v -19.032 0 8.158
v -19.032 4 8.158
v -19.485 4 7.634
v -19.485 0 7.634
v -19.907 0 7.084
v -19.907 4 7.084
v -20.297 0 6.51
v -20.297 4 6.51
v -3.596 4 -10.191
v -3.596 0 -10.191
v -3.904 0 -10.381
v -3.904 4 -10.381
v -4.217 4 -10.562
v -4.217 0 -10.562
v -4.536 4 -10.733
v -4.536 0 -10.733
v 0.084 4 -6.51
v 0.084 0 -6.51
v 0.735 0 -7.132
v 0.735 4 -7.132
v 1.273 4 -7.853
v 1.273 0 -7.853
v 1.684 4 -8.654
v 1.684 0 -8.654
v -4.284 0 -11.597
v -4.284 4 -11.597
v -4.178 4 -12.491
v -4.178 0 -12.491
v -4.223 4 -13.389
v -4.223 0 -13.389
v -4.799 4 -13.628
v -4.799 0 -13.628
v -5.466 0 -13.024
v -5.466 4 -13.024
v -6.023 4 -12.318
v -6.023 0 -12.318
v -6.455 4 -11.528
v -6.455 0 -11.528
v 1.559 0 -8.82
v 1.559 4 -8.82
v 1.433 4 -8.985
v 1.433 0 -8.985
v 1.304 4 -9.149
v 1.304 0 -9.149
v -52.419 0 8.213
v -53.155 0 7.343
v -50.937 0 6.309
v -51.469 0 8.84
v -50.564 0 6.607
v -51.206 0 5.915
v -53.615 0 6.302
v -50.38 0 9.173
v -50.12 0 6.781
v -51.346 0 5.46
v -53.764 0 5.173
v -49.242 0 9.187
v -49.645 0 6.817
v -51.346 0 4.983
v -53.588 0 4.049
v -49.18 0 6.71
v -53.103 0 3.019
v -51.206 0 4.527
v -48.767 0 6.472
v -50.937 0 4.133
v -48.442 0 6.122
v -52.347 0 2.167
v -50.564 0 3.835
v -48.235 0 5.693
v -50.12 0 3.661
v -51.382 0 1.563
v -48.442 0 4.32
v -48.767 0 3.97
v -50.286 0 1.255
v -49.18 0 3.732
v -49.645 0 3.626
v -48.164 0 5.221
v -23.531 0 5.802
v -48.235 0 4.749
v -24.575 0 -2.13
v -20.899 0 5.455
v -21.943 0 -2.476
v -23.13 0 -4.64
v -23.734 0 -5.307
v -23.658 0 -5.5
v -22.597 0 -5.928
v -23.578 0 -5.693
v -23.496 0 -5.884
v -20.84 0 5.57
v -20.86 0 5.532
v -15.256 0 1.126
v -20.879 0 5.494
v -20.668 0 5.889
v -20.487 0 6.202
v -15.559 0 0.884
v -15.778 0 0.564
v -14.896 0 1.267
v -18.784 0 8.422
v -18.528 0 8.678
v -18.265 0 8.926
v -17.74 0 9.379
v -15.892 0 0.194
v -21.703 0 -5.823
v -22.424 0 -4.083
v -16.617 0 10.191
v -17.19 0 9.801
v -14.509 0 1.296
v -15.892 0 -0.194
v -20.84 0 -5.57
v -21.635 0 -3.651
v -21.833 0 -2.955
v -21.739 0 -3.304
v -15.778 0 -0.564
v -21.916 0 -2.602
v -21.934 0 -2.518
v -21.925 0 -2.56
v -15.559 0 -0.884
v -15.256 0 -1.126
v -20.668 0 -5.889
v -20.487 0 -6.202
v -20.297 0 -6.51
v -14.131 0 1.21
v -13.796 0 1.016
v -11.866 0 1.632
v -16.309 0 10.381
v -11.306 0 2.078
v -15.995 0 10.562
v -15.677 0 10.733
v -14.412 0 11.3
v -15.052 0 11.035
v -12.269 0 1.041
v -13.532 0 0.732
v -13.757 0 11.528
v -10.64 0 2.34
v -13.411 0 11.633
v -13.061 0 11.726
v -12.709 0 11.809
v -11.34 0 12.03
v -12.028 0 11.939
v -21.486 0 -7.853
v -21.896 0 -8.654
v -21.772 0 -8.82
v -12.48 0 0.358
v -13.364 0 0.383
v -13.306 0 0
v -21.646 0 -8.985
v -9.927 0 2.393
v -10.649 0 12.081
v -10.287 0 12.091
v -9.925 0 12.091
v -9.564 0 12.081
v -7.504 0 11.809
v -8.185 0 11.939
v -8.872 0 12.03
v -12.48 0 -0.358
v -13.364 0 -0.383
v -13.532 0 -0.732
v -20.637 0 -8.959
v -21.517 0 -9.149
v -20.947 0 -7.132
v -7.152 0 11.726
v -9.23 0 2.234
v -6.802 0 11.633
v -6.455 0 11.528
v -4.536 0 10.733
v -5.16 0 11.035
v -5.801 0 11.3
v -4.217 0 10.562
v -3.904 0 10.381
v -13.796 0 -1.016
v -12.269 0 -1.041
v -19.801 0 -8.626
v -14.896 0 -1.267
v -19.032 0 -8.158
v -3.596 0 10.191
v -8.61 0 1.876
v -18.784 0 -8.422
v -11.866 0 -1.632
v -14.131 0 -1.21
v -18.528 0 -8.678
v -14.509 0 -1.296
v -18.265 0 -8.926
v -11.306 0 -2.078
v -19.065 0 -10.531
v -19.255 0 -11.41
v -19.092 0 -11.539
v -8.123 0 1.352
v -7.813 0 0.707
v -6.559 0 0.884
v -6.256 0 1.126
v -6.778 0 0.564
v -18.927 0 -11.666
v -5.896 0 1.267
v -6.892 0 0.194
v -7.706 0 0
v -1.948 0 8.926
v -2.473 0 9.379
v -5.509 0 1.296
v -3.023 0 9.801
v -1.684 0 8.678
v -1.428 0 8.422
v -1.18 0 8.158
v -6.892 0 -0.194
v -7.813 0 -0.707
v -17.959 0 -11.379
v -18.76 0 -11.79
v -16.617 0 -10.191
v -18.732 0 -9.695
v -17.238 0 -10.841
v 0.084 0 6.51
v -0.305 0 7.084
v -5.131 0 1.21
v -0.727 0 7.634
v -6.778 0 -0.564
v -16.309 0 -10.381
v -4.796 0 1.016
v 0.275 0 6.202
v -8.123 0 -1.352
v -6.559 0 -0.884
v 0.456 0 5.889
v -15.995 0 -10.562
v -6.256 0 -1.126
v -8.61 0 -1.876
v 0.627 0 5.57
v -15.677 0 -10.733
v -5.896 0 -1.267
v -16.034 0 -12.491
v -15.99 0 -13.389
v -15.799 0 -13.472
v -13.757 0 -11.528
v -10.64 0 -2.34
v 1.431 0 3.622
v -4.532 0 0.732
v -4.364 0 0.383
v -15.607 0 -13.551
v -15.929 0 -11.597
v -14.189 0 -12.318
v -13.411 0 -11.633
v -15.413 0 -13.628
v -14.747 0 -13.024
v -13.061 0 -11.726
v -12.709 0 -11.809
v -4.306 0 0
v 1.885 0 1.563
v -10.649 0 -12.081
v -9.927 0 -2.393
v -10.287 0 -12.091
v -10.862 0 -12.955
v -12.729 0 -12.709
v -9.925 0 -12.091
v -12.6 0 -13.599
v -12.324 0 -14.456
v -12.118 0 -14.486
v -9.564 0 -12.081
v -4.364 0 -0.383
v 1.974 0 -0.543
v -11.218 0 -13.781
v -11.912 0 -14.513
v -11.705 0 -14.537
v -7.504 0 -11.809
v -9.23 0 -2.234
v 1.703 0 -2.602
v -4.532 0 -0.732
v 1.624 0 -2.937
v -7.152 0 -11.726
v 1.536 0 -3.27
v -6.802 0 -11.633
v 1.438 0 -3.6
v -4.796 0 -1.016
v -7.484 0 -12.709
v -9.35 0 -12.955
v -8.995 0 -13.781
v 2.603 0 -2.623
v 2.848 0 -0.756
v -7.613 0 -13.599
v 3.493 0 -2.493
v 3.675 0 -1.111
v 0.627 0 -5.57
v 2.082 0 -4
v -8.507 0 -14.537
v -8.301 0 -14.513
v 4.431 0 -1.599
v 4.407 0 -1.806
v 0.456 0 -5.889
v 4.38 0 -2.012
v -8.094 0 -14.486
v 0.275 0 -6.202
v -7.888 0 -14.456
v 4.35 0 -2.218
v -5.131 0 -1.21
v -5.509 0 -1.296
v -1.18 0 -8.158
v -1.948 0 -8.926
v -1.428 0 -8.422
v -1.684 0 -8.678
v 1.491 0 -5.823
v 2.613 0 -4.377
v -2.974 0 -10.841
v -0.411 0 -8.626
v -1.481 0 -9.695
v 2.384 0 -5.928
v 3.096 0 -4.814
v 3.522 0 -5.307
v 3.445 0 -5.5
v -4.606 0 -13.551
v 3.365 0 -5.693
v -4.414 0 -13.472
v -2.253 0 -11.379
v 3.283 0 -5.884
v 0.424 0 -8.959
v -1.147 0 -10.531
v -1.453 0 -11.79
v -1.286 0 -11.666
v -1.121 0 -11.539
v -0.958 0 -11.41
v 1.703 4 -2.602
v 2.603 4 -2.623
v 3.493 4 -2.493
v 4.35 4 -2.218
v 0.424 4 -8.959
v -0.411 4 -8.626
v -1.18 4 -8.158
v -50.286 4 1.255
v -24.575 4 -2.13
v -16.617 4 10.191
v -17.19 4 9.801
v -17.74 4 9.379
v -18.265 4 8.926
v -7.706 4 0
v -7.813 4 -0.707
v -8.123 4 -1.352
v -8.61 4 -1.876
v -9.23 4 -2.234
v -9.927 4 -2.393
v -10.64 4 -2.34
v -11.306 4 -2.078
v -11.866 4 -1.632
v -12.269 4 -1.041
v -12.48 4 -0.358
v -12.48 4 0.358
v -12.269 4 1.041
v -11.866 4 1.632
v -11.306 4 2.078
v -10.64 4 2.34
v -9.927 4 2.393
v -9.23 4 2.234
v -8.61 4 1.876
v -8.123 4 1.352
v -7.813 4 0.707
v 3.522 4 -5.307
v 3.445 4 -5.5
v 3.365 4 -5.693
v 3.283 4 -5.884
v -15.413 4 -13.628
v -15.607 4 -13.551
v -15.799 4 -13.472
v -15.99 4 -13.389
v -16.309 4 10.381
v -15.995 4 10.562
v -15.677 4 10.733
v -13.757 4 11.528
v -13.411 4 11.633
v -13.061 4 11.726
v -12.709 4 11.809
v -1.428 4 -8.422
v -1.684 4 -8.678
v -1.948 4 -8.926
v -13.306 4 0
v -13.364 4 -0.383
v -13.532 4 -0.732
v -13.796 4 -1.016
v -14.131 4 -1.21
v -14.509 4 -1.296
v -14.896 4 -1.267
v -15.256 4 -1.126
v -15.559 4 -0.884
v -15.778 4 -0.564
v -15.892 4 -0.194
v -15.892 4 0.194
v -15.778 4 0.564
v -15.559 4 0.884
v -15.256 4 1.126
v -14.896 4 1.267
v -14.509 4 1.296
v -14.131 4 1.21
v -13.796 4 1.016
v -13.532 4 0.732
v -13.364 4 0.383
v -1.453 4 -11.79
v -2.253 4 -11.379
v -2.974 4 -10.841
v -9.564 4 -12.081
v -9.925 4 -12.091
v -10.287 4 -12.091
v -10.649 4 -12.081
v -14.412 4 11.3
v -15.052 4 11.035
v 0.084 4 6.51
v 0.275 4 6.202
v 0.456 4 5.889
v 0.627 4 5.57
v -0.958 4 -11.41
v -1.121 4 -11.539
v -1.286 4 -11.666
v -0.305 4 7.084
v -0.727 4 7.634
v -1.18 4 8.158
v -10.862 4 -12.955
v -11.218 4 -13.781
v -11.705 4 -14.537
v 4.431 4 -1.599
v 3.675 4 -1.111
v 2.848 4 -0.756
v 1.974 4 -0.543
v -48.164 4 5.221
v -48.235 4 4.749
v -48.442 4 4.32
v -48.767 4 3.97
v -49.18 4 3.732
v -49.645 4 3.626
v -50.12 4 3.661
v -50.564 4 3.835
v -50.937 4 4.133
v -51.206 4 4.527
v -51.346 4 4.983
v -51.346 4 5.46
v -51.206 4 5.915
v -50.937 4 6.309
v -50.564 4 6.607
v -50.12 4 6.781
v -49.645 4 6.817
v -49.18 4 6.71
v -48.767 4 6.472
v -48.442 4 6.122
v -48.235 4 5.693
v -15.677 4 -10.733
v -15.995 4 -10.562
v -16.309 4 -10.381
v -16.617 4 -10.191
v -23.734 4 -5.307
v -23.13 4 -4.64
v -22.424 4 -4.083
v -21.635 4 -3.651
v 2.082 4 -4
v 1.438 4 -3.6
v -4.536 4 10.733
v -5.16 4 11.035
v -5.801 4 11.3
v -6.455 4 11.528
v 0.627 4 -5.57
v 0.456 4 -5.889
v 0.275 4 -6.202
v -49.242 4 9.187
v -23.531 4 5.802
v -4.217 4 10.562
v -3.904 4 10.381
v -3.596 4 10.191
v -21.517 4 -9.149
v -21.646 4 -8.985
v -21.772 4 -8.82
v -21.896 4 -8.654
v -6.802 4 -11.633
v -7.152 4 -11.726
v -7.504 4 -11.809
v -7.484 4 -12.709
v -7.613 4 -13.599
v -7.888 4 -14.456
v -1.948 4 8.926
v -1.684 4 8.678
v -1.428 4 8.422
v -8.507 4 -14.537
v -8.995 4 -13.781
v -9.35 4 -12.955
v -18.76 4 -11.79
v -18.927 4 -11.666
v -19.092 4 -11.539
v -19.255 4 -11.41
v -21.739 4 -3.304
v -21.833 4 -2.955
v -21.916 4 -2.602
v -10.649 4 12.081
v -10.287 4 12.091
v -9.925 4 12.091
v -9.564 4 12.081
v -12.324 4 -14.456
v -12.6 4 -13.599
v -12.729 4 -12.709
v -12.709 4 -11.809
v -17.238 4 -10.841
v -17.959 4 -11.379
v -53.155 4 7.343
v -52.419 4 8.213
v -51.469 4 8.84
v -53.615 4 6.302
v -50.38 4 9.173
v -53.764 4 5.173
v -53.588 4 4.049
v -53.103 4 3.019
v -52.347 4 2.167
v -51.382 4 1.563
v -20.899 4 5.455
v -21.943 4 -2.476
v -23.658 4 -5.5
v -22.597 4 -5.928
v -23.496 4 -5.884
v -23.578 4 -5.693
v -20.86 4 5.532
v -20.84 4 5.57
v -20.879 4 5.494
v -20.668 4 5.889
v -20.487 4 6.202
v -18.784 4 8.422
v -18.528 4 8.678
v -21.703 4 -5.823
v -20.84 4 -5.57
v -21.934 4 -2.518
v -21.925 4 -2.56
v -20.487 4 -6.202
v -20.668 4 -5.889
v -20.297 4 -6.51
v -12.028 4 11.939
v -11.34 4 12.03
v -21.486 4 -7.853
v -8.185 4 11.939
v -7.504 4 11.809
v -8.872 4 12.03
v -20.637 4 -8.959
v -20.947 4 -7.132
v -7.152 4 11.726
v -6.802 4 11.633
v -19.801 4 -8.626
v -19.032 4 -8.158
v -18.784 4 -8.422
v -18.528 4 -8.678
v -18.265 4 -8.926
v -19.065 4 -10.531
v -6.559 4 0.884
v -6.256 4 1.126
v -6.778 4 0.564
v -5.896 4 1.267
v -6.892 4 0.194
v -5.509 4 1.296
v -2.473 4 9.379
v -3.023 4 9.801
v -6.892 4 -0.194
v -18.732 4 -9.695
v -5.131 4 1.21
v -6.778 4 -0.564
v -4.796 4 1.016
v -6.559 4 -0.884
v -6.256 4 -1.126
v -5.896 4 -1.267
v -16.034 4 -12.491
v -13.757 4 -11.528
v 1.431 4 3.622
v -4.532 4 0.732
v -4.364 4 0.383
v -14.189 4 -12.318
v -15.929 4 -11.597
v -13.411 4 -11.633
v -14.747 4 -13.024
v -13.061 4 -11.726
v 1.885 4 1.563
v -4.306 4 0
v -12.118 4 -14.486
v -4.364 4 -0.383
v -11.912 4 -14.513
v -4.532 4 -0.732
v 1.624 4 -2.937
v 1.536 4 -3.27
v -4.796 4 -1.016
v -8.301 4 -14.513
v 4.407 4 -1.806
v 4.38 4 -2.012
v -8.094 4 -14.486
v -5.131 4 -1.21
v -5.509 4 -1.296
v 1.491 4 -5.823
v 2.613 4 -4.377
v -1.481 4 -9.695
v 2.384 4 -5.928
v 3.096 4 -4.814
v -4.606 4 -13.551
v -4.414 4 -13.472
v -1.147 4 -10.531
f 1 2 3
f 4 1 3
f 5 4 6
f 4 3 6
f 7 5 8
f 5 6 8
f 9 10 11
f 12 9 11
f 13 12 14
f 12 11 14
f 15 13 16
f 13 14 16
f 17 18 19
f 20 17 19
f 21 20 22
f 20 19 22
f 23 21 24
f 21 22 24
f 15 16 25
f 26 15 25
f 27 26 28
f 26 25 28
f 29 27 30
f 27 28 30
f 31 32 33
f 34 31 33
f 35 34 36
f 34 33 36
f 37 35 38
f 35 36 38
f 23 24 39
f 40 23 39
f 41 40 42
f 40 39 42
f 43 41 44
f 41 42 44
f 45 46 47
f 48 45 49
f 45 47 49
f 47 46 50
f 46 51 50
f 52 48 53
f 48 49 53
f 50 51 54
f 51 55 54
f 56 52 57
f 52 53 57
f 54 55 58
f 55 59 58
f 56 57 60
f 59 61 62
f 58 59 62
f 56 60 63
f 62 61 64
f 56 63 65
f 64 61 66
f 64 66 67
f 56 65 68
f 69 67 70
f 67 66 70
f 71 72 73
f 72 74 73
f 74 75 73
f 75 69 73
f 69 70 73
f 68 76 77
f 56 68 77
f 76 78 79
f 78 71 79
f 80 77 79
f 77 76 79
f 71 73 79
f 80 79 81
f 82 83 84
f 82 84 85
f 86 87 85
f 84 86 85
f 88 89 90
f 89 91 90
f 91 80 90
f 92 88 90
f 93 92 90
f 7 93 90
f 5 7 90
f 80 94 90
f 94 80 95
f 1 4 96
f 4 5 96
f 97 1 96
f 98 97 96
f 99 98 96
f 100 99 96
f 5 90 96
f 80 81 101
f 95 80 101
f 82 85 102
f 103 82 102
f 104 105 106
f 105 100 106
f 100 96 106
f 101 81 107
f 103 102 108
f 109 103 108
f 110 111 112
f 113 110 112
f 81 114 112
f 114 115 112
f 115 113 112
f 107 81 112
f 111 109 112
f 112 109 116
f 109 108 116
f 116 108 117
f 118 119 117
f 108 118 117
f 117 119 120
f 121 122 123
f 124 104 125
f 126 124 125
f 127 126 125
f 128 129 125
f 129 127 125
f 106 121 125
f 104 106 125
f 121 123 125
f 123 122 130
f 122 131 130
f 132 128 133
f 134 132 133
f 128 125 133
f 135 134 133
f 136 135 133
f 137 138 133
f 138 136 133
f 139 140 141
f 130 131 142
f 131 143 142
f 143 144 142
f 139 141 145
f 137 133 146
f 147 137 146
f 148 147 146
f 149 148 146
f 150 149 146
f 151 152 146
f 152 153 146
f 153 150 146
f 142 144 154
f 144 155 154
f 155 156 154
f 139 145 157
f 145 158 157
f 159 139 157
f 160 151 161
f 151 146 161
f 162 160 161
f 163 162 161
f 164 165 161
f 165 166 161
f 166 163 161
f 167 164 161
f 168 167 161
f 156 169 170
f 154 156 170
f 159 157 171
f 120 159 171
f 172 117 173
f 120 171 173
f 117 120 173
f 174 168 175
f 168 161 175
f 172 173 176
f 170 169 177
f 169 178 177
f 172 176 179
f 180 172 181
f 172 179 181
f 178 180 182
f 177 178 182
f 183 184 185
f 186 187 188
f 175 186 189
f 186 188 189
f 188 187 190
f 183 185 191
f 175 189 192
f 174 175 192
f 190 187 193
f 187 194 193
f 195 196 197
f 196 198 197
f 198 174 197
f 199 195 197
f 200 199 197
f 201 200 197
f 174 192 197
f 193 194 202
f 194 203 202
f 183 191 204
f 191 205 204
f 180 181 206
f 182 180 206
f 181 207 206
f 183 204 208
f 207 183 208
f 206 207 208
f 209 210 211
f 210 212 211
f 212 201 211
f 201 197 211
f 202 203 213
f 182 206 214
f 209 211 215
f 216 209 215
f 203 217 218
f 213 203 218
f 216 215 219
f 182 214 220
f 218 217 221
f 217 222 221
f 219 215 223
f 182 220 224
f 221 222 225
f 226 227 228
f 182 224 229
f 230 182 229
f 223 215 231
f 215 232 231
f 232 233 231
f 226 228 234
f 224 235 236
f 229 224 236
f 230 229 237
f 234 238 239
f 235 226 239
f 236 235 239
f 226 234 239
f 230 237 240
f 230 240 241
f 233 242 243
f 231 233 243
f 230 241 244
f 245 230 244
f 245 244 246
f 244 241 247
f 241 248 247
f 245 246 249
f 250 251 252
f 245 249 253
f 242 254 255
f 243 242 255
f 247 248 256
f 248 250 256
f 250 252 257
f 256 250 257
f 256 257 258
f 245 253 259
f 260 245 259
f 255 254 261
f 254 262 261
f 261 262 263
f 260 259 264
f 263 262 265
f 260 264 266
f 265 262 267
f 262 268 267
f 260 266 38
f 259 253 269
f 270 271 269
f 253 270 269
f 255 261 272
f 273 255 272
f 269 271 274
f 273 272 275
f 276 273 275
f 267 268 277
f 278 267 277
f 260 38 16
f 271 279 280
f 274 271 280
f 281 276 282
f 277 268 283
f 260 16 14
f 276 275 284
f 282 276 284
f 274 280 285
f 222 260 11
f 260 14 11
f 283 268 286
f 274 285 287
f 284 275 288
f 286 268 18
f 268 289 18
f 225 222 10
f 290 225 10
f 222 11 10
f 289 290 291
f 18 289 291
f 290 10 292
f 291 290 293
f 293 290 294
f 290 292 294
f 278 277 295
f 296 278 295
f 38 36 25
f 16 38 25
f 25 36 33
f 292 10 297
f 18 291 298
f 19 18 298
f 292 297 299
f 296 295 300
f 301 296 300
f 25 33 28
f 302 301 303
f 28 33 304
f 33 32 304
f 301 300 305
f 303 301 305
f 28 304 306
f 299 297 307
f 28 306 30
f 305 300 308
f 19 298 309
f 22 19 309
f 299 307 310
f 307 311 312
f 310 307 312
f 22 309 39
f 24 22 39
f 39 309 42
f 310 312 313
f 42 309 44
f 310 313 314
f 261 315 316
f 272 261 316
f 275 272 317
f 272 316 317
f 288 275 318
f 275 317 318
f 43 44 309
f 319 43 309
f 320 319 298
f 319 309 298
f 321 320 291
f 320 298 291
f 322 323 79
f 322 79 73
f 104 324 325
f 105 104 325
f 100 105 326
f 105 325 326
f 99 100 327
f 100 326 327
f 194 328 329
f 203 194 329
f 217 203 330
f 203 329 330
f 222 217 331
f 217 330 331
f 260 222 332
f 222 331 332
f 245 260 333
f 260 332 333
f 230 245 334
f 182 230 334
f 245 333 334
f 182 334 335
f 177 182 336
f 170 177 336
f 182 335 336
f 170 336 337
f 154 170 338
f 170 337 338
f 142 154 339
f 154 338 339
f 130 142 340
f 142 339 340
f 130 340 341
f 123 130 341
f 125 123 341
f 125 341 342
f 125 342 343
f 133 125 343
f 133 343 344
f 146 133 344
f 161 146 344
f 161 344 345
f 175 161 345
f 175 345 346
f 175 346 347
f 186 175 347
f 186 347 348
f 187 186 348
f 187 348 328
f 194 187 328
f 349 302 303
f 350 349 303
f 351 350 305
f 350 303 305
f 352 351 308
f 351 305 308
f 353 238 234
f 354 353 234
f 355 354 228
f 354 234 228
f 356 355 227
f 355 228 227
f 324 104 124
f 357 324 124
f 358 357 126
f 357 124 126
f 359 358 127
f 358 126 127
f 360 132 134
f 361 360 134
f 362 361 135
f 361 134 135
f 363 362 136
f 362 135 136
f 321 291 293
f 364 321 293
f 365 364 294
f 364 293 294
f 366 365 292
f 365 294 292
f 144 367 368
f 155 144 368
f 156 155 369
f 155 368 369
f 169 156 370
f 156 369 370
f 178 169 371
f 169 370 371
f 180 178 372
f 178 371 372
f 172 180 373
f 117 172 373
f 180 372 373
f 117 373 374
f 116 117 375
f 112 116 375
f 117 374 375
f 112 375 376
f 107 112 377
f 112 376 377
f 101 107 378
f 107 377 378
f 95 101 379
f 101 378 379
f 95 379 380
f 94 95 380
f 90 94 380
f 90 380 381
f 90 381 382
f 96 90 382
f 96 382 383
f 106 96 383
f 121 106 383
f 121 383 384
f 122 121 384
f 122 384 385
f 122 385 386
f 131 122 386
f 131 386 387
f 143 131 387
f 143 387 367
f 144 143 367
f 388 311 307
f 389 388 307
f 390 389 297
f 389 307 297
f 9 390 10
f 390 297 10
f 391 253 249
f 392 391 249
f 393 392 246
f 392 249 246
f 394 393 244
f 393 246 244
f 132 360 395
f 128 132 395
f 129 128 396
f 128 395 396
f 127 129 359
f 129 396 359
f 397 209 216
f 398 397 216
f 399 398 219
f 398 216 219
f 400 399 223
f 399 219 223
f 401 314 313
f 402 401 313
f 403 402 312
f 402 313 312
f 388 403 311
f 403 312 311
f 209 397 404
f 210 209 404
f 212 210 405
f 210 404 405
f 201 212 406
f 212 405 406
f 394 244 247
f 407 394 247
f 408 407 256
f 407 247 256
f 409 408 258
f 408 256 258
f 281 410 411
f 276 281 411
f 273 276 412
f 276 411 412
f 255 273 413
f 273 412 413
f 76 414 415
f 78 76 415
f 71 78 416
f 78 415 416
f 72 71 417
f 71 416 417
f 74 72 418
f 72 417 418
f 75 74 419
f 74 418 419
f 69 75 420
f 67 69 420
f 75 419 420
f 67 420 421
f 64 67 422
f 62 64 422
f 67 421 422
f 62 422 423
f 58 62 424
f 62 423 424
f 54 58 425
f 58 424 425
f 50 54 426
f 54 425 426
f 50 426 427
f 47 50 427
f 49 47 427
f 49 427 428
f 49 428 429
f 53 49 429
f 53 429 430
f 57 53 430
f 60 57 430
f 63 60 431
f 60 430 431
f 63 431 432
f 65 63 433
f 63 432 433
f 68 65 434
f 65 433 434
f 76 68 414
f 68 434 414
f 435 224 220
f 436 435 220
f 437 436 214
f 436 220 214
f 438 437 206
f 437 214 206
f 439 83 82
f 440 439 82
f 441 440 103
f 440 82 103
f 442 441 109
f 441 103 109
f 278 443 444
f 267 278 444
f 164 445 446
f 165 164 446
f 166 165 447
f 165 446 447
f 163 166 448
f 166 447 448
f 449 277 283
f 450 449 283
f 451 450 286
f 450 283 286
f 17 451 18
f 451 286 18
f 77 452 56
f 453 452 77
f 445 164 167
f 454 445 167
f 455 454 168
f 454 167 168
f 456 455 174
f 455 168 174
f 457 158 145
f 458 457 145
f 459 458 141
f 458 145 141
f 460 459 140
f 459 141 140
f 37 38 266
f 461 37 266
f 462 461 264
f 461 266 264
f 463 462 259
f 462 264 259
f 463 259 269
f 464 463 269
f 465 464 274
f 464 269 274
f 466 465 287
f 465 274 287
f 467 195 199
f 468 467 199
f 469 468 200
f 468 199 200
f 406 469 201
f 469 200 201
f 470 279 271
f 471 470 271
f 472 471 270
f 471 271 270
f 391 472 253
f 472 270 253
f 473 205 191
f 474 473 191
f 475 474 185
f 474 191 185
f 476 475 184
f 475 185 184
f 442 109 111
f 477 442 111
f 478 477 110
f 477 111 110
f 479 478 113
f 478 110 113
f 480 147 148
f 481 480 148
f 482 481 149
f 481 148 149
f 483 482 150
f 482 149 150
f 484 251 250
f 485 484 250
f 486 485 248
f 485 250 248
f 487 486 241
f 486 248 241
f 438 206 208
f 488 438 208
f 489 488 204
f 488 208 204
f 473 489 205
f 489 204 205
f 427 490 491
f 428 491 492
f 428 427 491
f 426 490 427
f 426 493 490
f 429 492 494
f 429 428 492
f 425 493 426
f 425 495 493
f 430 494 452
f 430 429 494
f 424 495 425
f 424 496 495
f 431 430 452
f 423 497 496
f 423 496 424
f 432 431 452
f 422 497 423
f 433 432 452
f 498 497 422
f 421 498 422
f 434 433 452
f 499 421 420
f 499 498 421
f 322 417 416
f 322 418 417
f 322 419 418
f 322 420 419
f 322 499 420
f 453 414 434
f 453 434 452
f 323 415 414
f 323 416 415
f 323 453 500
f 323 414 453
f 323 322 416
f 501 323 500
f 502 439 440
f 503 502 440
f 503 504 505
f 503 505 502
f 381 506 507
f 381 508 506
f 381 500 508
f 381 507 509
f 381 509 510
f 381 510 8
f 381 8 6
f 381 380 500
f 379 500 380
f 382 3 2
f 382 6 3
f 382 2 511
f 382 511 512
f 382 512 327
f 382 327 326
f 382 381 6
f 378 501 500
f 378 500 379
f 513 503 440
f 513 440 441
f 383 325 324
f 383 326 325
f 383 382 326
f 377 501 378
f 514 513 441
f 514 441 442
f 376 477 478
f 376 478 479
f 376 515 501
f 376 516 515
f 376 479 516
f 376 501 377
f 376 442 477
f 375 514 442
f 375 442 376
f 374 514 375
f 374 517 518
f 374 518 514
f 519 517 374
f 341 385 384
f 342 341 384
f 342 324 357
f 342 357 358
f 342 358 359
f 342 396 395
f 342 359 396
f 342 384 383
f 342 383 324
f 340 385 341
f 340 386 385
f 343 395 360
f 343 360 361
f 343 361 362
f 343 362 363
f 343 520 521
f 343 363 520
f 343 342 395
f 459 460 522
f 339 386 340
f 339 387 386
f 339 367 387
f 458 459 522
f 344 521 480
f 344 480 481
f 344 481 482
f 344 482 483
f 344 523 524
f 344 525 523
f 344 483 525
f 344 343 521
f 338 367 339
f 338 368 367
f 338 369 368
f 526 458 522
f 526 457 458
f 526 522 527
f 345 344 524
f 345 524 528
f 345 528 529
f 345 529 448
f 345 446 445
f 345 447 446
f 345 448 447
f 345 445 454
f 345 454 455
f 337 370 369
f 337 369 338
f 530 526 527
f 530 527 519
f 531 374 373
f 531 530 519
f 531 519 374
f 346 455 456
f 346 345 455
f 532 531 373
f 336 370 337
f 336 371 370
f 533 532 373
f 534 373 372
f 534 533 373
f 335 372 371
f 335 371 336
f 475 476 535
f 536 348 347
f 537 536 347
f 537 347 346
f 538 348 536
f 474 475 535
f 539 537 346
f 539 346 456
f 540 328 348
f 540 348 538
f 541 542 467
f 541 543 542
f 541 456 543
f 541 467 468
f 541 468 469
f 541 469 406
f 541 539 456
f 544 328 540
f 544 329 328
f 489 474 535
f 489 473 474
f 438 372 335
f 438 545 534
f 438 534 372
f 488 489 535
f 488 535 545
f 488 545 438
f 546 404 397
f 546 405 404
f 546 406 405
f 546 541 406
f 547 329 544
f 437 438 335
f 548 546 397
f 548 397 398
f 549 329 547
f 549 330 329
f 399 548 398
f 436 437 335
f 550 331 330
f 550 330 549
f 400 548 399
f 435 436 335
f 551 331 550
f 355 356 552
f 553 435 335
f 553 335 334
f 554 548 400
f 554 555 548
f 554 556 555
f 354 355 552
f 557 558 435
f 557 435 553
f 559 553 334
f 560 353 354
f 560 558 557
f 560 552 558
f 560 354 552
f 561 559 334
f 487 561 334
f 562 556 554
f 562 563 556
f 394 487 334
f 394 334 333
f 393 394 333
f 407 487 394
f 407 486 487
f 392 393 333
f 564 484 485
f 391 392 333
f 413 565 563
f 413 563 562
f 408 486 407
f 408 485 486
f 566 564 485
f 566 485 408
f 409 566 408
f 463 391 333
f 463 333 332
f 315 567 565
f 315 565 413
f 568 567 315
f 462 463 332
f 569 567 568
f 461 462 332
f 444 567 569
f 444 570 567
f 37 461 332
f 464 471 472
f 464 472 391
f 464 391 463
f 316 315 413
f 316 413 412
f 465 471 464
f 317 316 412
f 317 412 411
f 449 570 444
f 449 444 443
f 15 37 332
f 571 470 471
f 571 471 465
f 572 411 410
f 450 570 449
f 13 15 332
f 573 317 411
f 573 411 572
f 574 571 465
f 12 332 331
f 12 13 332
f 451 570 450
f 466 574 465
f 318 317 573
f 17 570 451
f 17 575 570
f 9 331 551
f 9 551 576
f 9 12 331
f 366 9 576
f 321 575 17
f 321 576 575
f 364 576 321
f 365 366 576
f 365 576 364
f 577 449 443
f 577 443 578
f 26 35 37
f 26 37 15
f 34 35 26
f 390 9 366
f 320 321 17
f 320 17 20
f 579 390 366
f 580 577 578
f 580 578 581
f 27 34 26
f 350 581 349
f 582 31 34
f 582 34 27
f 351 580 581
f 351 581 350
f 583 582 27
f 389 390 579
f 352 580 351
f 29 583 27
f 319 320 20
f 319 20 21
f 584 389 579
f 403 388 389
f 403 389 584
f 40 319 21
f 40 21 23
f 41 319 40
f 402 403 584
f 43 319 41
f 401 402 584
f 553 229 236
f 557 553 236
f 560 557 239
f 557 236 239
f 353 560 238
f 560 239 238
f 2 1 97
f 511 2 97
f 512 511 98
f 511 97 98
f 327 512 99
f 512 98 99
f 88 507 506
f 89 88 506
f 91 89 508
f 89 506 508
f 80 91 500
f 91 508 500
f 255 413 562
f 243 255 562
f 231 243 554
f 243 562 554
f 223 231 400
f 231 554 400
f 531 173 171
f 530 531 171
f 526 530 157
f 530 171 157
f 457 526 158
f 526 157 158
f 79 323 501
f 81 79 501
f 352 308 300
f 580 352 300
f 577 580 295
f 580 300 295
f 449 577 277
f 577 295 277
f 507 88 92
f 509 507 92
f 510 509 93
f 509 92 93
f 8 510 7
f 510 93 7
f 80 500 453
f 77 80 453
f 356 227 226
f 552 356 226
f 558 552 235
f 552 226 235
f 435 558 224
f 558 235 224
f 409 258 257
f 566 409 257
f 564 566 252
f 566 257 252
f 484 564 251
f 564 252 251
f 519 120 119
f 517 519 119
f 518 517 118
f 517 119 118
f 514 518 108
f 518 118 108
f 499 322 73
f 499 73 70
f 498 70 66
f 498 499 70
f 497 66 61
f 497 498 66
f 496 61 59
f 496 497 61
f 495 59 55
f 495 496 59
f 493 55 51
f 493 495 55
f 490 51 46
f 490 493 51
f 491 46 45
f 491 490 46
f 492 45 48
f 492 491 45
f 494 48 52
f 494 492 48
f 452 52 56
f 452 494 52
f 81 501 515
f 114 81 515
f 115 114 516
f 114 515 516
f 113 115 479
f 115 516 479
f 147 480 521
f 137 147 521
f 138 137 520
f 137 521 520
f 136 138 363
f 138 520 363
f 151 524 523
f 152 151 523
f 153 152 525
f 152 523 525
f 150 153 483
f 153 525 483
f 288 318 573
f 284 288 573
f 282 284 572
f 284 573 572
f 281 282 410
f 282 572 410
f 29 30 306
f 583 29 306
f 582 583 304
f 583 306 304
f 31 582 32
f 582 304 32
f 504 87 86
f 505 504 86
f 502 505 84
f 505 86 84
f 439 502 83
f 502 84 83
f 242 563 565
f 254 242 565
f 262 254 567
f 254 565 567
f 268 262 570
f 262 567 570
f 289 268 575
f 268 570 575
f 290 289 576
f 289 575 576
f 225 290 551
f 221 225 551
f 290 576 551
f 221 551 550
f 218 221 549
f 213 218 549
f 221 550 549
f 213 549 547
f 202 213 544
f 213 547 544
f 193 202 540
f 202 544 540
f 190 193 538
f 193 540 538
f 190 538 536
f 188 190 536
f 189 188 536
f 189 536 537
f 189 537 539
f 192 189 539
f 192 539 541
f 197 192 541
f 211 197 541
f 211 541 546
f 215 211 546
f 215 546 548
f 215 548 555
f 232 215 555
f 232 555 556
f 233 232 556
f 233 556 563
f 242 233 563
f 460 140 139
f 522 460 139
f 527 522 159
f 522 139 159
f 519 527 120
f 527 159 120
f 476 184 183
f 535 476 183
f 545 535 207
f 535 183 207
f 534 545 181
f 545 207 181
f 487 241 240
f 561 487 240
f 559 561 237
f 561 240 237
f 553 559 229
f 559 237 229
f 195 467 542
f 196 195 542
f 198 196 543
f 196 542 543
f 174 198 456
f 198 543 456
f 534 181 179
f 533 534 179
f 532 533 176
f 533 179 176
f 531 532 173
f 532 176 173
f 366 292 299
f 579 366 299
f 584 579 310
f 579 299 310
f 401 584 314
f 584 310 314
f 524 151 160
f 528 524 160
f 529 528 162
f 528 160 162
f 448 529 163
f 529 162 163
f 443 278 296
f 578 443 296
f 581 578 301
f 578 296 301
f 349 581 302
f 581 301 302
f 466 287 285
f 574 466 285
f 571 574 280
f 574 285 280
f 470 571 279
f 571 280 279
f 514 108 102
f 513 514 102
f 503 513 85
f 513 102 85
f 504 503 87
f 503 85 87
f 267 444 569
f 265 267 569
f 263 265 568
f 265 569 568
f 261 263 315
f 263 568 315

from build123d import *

# Parameters (mm, degrees)
SKETCH1_R           = 1.5
SKETCH1_R_2         = 1.6
BOSS_EXTRUDE1_DEPTH = 4
SKETCH3_R           = 1.6
BOSS_EXTRUDE2_DEPTH = 4
CUT_EXTRUDE1_DEPTH  = 4
CUT_EXTRUDE2_REACH  = 6
SKETCH5_R           = 1.3
SKETCH5_R_2         = 2.4


with BuildPart() as part:
    # Sketch1 → Boss-Extrude1 (new body)
    with BuildSketch(Plane(origin=(0, 0, 0), x_dir=(1, 0, 0), z_dir=(0, 1, 0))):
        with BuildLine():
            Line((20.643657446, 4), (2.081641936, 4))
            ThreePointArc((2.081641936, 4), (2.861028333, 4.588201733), (3.521749436, 5.30713988))
            ThreePointArc((3.521749436, 5.30713988), (3.405395609, 5.596745198), (3.282888305, 5.883801663))
            ThreePointArc((3.282888305, 5.883801663), (1.93527598, 5.894040025), (0.627094961, 5.57027124))
            ThreePointArc((0.627094961, 5.57027124), (0.366286148, 6.046375), (0.084372603, 6.510293938))
            ThreePointArc((0.084372603, 6.510293938), (1.018855105, 7.48132754), (1.683794586, 8.65351323))
            ThreePointArc((1.683794586, 8.65351323), (1.496450048, 8.903135899), (1.303821399, 9.148703928))
            ThreePointArc((1.303821399, 9.148703928), (-0.000522033, 8.809805691), (-1.180330337, 8.158486898))
            ThreePointArc((-1.180330337, 8.158486898), (-1.555477026, 8.550865528), (-1.947855656, 8.926012217))
            ThreePointArc((-1.947855656, 8.926012217), (-1.296536862, 10.105820521), (-0.957638625, 11.410163953))
            ThreePointArc((-0.957638625, 11.410163953), (-1.203206655, 11.602792602), (-1.452829324, 11.79013714))
            ThreePointArc((-1.452829324, 11.79013714), (-2.625015014, 11.125197659), (-3.596048616, 10.190715157))
            ThreePointArc((-3.596048616, 10.190715157), (-4.059967554, 10.472628702), (-4.536071314, 10.733437515))
            ThreePointArc((-4.536071314, 10.733437515), (-4.212302529, 12.041618533), (-4.222540891, 13.389230859))
            ThreePointArc((-4.222540891, 13.389230859), (-4.509597355, 13.511738163), (-4.799202674, 13.62809199))
            ThreePointArc((-4.799202674, 13.62809199), (-5.759348103, 12.682425791), (-6.455432668, 11.528463019))
            ThreePointArc((-6.455432668, 11.528463019), (-6.976508546, 11.680699536), (-7.503891752, 11.809396783))
            ThreePointArc((-7.503891752, 11.809396783), (-7.529737283, 13.156800143), (-7.888414517, 14.455843809))
            ThreePointArc((-7.888414517, 14.455843809), (-8.197396993, 14.499881098), (-8.507248835, 14.537314892))
            ThreePointArc((-8.507248835, 14.537314892), (-9.18992168, 13.375367565), (-9.563620196, 12.080565177))
            ThreePointArc((-9.563620196, 12.080565177), (-10.106342554, 12.09275), (-10.649064912, 12.080565177))
            ThreePointArc((-10.649064912, 12.080565177), (-11.022763428, 13.375367565), (-11.705436272, 14.537314892))
            ThreePointArc((-11.705436272, 14.537314892), (-12.015288115, 14.499881098), (-12.324270591, 14.455843809))
            ThreePointArc((-12.324270591, 14.455843809), (-12.682947825, 13.156800143), (-12.708793355, 11.809396783))
            ThreePointArc((-12.708793355, 11.809396783), (-13.236176561, 11.680699536), (-13.757252439, 11.528463019))
            ThreePointArc((-13.757252439, 11.528463019), (-14.453337005, 12.682425791), (-15.413482434, 13.62809199))
            ThreePointArc((-15.413482434, 13.62809199), (-15.703087752, 13.511738163), (-15.990144217, 13.389230859))
            ThreePointArc((-15.990144217, 13.389230859), (-16.000382579, 12.041618533), (-15.676613793, 10.733437515))
            ThreePointArc((-15.676613793, 10.733437515), (-16.152717554, 10.472628702), (-16.616636492, 10.190715157))
            ThreePointArc((-16.616636492, 10.190715157), (-17.587670094, 11.125197659), (-18.759855783, 11.79013714))
            ThreePointArc((-18.759855783, 11.79013714), (-19.009478453, 11.602792602), (-19.255046482, 11.410163953))
            ThreePointArc((-19.255046482, 11.410163953), (-18.916148245, 10.105820521), (-18.264829452, 8.926012217))
            ThreePointArc((-18.264829452, 8.926012217), (-18.657208082, 8.550865528), (-19.032354771, 8.158486898))
            ThreePointArc((-19.032354771, 8.158486898), (-20.212163074, 8.809805691), (-21.516506507, 9.148703928))
            ThreePointArc((-21.516506507, 9.148703928), (-21.709135156, 8.903135899), (-21.896479694, 8.65351323))
            ThreePointArc((-21.896479694, 8.65351323), (-21.231540213, 7.48132754), (-20.297057711, 6.510293938))
            ThreePointArc((-20.297057711, 6.510293938), (-20.578971255, 6.046375), (-20.839780068, 5.57027124))
            ThreePointArc((-20.839780068, 5.57027124), (-22.147961087, 5.894040025), (-23.495573413, 5.883801663))
            ThreePointArc((-23.495573413, 5.883801663), (-23.618080717, 5.596745198), (-23.734434544, 5.30713988))
            ThreePointArc((-23.734434544, 5.30713988), (-22.788768345, 4.346994451), (-21.634805572, 3.650909885))
            ThreePointArc((-21.634805572, 3.650909885), (-21.78704209, 3.129834008), (-21.915739337, 2.602450802))
            ThreePointArc((-21.915739337, 2.602450802), (-23.263142697, 2.576605271), (-24.562186363, 2.217928037))
            ThreePointArc((-24.562186363, 2.217928037), (-24.606223651, 1.908945561), (-24.643657446, 1.599093719))
            ThreePointArc((-24.643657446, 1.599093719), (-23.481710119, 0.916420874), (-22.186907731, 0.542722358))
            ThreePointArc((-22.186907731, 0.542722358), (-22.199092554, 0), (-22.186907731, -0.542722358))
            ThreePointArc((-22.186907731, -0.542722358), (-23.481710119, -0.916420874), (-24.643657446, -1.599093719))
            ThreePointArc((-24.643657446, -1.599093719), (-24.606223651, -1.908945561), (-24.562186363, -2.217928037))
            ThreePointArc((-24.562186363, -2.217928037), (-23.263142697, -2.576605271), (-21.915739337, -2.602450802))
            ThreePointArc((-21.915739337, -2.602450802), (-21.78704209, -3.129834008), (-21.634805572, -3.650909885))
            ThreePointArc((-21.634805572, -3.650909885), (-22.788768345, -4.346994451), (-23.734434544, -5.30713988))
            ThreePointArc((-23.734434544, -5.30713988), (-23.618080717, -5.596745198), (-23.495573413, -5.883801663))
            ThreePointArc((-23.495573413, -5.883801663), (-22.147961087, -5.894040025), (-20.839780068, -5.57027124))
            ThreePointArc((-20.839780068, -5.57027124), (-20.578971255, -6.046375), (-20.297057711, -6.510293938))
            ThreePointArc((-20.297057711, -6.510293938), (-21.231540213, -7.48132754), (-21.896479694, -8.65351323))
            ThreePointArc((-21.896479694, -8.65351323), (-21.709135156, -8.903135899), (-21.516506507, -9.148703928))
            ThreePointArc((-21.516506507, -9.148703928), (-20.212163074, -8.809805691), (-19.032354771, -8.158486898))
            ThreePointArc((-19.032354771, -8.158486898), (-18.657208082, -8.550865528), (-18.264829452, -8.926012217))
            ThreePointArc((-18.264829452, -8.926012217), (-18.916148245, -10.105820521), (-19.255046482, -11.410163953))
            ThreePointArc((-19.255046482, -11.410163953), (-19.009478453, -11.602792602), (-18.759855783, -11.79013714))
            ThreePointArc((-18.759855783, -11.79013714), (-17.587670094, -11.125197659), (-16.616636492, -10.190715157))
            ThreePointArc((-16.616636492, -10.190715157), (-16.152717554, -10.472628702), (-15.676613793, -10.733437515))
            ThreePointArc((-15.676613793, -10.733437515), (-16.000382579, -12.041618533), (-15.990144217, -13.389230859))
            ThreePointArc((-15.990144217, -13.389230859), (-15.703087752, -13.511738163), (-15.413482434, -13.62809199))
            ThreePointArc((-15.413482434, -13.62809199), (-14.453337005, -12.682425791), (-13.757252439, -11.528463019))
            ThreePointArc((-13.757252439, -11.528463019), (-13.236176561, -11.680699536), (-12.708793355, -11.809396783))
            ThreePointArc((-12.708793355, -11.809396783), (-12.682947825, -13.156800143), (-12.324270591, -14.455843809))
            ThreePointArc((-12.324270591, -14.455843809), (-12.015288115, -14.499881098), (-11.705436272, -14.537314892))
            ThreePointArc((-11.705436272, -14.537314892), (-11.022763428, -13.375367565), (-10.649064912, -12.080565177))
            ThreePointArc((-10.649064912, -12.080565177), (-10.106342554, -12.09275), (-9.563620196, -12.080565177))
            ThreePointArc((-9.563620196, -12.080565177), (-9.18992168, -13.375367565), (-8.507248835, -14.537314892))
            ThreePointArc((-8.507248835, -14.537314892), (-8.197396993, -14.499881098), (-7.888414517, -14.455843809))
            ThreePointArc((-7.888414517, -14.455843809), (-7.529737283, -13.156800143), (-7.503891752, -11.809396783))
            ThreePointArc((-7.503891752, -11.809396783), (-6.976508546, -11.680699536), (-6.455432668, -11.528463019))
            ThreePointArc((-6.455432668, -11.528463019), (-5.759348103, -12.682425791), (-4.799202674, -13.62809199))
            ThreePointArc((-4.799202674, -13.62809199), (-4.509597355, -13.511738163), (-4.222540891, -13.389230859))
            ThreePointArc((-4.222540891, -13.389230859), (-4.212302529, -12.041618533), (-4.536071314, -10.733437515))
            ThreePointArc((-4.536071314, -10.733437515), (-4.059967554, -10.472628702), (-3.596048616, -10.190715157))
            ThreePointArc((-3.596048616, -10.190715157), (-2.625015014, -11.125197659), (-1.452829324, -11.79013714))
            ThreePointArc((-1.452829324, -11.79013714), (-1.203206655, -11.602792602), (-0.957638625, -11.410163953))
            ThreePointArc((-0.957638625, -11.410163953), (-1.296536862, -10.105820521), (-1.947855656, -8.926012217))
            ThreePointArc((-1.947855656, -8.926012217), (-1.555477026, -8.550865528), (-1.180330337, -8.158486898))
            ThreePointArc((-1.180330337, -8.158486898), (-0.000522033, -8.809805691), (1.303821399, -9.148703928))
            ThreePointArc((1.303821399, -9.148703928), (1.496450048, -8.903135899), (1.683794586, -8.65351323))
            ThreePointArc((1.683794586, -8.65351323), (1.018855105, -7.48132754), (0.084372603, -6.510293938))
            ThreePointArc((0.084372603, -6.510293938), (0.366286148, -6.046375), (0.627094961, -5.57027124))
            ThreePointArc((0.627094961, -5.57027124), (1.93527598, -5.894040025), (3.282888305, -5.883801663))
            ThreePointArc((3.282888305, -5.883801663), (3.405395609, -5.596745198), (3.521749436, -5.30713988))
            ThreePointArc((3.521749436, -5.30713988), (2.861028333, -4.588201733), (2.081641936, -4))
            Line((2.081641936, -4), (20.643657446, -4))
            ThreePointArc((20.643657446, -4), (24.643657446, 0), (20.643657446, 4))
        make_face()
        with Locations((-10.106342554, 0)):
            Circle(SKETCH1_R, mode=Mode.SUBTRACT)
        with Locations((20.643657446, 0)):
            Circle(SKETCH1_R_2, mode=Mode.SUBTRACT)
    extrude(amount=BOSS_EXTRUDE1_DEPTH)

    # Sketch3 → Boss-Extrude2 (add)
    with BuildSketch(Plane(origin=(0, 4, 0), x_dir=(1, 0, 0), z_dir=(0, 1, 0))):
        with BuildLine():
            ThreePointArc((-9.584237785, -3.965779445), (-14.072121999, -0.522104769), (-10.628447323, 3.965779445))
            Line((-10.628447323, 3.965779445), (-50.286241778, -1.255268243))
            ThreePointArc((-50.286241778, -1.255268243), (-53.729916454, -5.743152458), (-49.24203224, -9.186827134))
            Line((-49.24203224, -9.186827134), (-9.584237785, -3.965779445))
        make_face()
        with Locations((-49.764137009, -5.221047689)):
            Circle(SKETCH3_R, mode=Mode.SUBTRACT)
    extrude(amount=-BOSS_EXTRUDE2_DEPTH)

    # Sketch4 → Cut-Extrude1 (cut)
    with BuildSketch(Plane(origin=(0, 4, 0), x_dir=(1, 0, 0), z_dir=(0, 1, 0))):
        with BuildLine():
            ThreePointArc((20.643657446, -4), (24.643657446, 0), (20.643657446, 4))
            Line((20.643657446, 4), (2.081641936, 4))
            Line((2.081641936, 4), (1.43808022, 3.600125745))
            ThreePointArc((1.43808022, 3.600125745), (1.581217534, 3.104116905), (1.70305423, 2.602450802))
            ThreePointArc((1.70305423, 2.602450802), (3.050457589, 2.576605271), (4.349501255, 2.217928037))
            ThreePointArc((4.349501255, 2.217928037), (4.393538544, 1.908945561), (4.430972339, 1.599093719))
            ThreePointArc((4.430972339, 1.599093719), (3.269025011, 0.916420874), (1.974222624, 0.542722358))
            ThreePointArc((1.974222624, 0.542722358), (1.70305423, -2.602450802), (0.627094961, -5.57027124))
            ThreePointArc((0.627094961, -5.57027124), (1.93527598, -5.894040025), (3.282888305, -5.883801663))
            ThreePointArc((3.282888305, -5.883801663), (3.405395609, -5.596745198), (3.521749436, -5.30713988))
            ThreePointArc((3.521749436, -5.30713988), (2.861028333, -4.588201733), (2.081641936, -4))
            Line((2.081641936, -4), (20.643657446, -4))
        make_face()
        with BuildLine():
            ThreePointArc((1.683794586, -8.65351323), (1.018855105, -7.48132754), (0.084372603, -6.510293938))
            ThreePointArc((0.084372603, -6.510293938), (-0.512518948, -7.361599771), (-1.180330337, -8.158486898))
            ThreePointArc((-1.180330337, -8.158486898), (-0.000522033, -8.809805691), (1.303821399, -9.148703928))
            ThreePointArc((1.303821399, -9.148703928), (1.496450048, -8.903135899), (1.683794586, -8.65351323))
        make_face()
        with BuildLine():
            ThreePointArc((-0.957638625, -11.410163953), (-1.296536862, -10.105820521), (-1.947855656, -8.926012217))
            ThreePointArc((-1.947855656, -8.926012217), (-2.744742783, -9.593823606), (-3.596048616, -10.190715157))
            ThreePointArc((-3.596048616, -10.190715157), (-2.625015014, -11.125197659), (-1.452829324, -11.79013714))
            ThreePointArc((-1.452829324, -11.79013714), (-1.203206655, -11.602792602), (-0.957638625, -11.410163953))
        make_face()
        with BuildLine():
            ThreePointArc((-4.222540891, -13.389230859), (-4.212302529, -12.041618533), (-4.536071314, -10.733437515))
            ThreePointArc((-4.536071314, -10.733437515), (-5.478647477, -11.172244217), (-6.455432668, -11.528463019))
            ThreePointArc((-6.455432668, -11.528463019), (-5.759348103, -12.682425791), (-4.799202674, -13.62809199))
            ThreePointArc((-4.799202674, -13.62809199), (-4.509597355, -13.511738163), (-4.222540891, -13.389230859))
        make_face()
        with BuildLine():
            ThreePointArc((-7.888414517, -14.455843809), (-7.529737283, -13.156800143), (-7.503891752, -11.809396783))
            ThreePointArc((-7.503891752, -11.809396783), (-8.527921943, -11.989294847), (-9.563620196, -12.080565177))
            ThreePointArc((-9.563620196, -12.080565177), (-9.18992168, -13.375367565), (-8.507248835, -14.537314892))
            ThreePointArc((-8.507248835, -14.537314892), (-8.197396993, -14.499881098), (-7.888414517, -14.455843809))
        make_face()
        with BuildLine():
            ThreePointArc((-11.705436272, -14.537314892), (-11.022763428, -13.375367565), (-10.649064912, -12.080565177))
            ThreePointArc((-10.649064912, -12.080565177), (-11.684763165, -11.989294847), (-12.708793355, -11.809396783))
            ThreePointArc((-12.708793355, -11.809396783), (-12.682947825, -13.156800143), (-12.324270591, -14.455843809))
            ThreePointArc((-12.324270591, -14.455843809), (-12.015288115, -14.499881098), (-11.705436272, -14.537314892))
        make_face()
        with BuildLine():
            ThreePointArc((-15.413482434, -13.62809199), (-14.453337005, -12.682425791), (-13.757252439, -11.528463019))
            ThreePointArc((-13.757252439, -11.528463019), (-14.734037631, -11.172244217), (-15.676613793, -10.733437515))
            ThreePointArc((-15.676613793, -10.733437515), (-16.000382579, -12.041618533), (-15.990144217, -13.389230859))
            ThreePointArc((-15.990144217, -13.389230859), (-15.703087752, -13.511738163), (-15.413482434, -13.62809199))
        make_face()
        with BuildLine():
            ThreePointArc((-18.759855783, -11.79013714), (-17.587670094, -11.125197659), (-16.616636492, -10.190715157))
            ThreePointArc((-16.616636492, -10.190715157), (-17.467942324, -9.593823606), (-18.264829452, -8.926012217))
            ThreePointArc((-18.264829452, -8.926012217), (-18.916148245, -10.105820521), (-19.255046482, -11.410163953))
            ThreePointArc((-19.255046482, -11.410163953), (-19.009478453, -11.602792602), (-18.759855783, -11.79013714))
        make_face()
        with BuildLine():
            ThreePointArc((-21.516506507, -9.148703928), (-20.212163074, -8.809805691), (-19.032354771, -8.158486898))
            ThreePointArc((-19.032354771, -8.158486898), (-19.70016616, -7.361599771), (-20.297057711, -6.510293938))
            ThreePointArc((-20.297057711, -6.510293938), (-21.231540213, -7.48132754), (-21.896479694, -8.65351323))
            ThreePointArc((-21.896479694, -8.65351323), (-21.709135156, -8.903135899), (-21.516506507, -9.148703928))
        make_face()
        with BuildLine():
            ThreePointArc((-21.942853375, 2.47620963), (-21.92946485, 2.539366405), (-21.915739337, 2.602450802))
            ThreePointArc((-21.915739337, 2.602450802), (-23.263142697, 2.576605271), (-24.562186363, 2.217928037))
            ThreePointArc((-24.562186363, 2.217928037), (-24.56889027, 2.173784387), (-24.575459377, 2.129620475))
            Line((-24.575459377, 2.129620475), (-21.942853375, 2.47620963))
        make_face()
        with BuildLine():
            ThreePointArc((-23.495573413, -5.883801663), (-22.147961087, -5.894040025), (-20.839780068, -5.57027124))
            ThreePointArc((-20.839780068, -5.57027124), (-20.869365339, -5.512888815), (-20.898643838, -5.455349261))
            Line((-20.898643838, -5.455349261), (-23.531249839, -5.801938416))
            ThreePointArc((-23.531249839, -5.801938416), (-23.513474108, -5.842897269), (-23.495573413, -5.883801663))
        make_face()
    extrude(amount=-CUT_EXTRUDE1_DEPTH, mode=Mode.SUBTRACT)

    # Sketch5 → Cut-Extrude2 (cut, up to next)
    with BuildSketch(Plane(origin=(0, 4, 0), x_dir=(1, 0, 0), z_dir=(0, 1, 0)), mode=Mode.PRIVATE) as cut_extrude2_sk1:
        with Locations((-14.606342554, 0)):
            Circle(SKETCH5_R)
    cut_extrude2_tool1 = extrude(cut_extrude2_sk1.sketch, amount=-CUT_EXTRUDE2_REACH, mode=Mode.PRIVATE) & part.part
    add(cut_extrude2_tool1.solids().sort_by_distance((-14.606343, 4, 0))[0], mode=Mode.SUBTRACT)
    # Sketch5 → Cut-Extrude2 (cut, up to next)
    with BuildSketch(Plane(origin=(0, 4, 0), x_dir=(1, 0, 0), z_dir=(0, 1, 0)), mode=Mode.PRIVATE) as cut_extrude2_sk2:
        with Locations((-5.606342554, 0)):
            Circle(SKETCH5_R)
    cut_extrude2_tool2 = extrude(cut_extrude2_sk2.sketch, amount=-CUT_EXTRUDE2_REACH, mode=Mode.PRIVATE) & part.part
    add(cut_extrude2_tool2.solids().sort_by_distance((-5.606343, 4, 0))[0], mode=Mode.SUBTRACT)
    # Sketch5 → Cut-Extrude2 (cut, up to next)
    with BuildSketch(Plane(origin=(0, 4, 0), x_dir=(1, 0, 0), z_dir=(0, 1, 0)), mode=Mode.PRIVATE) as cut_extrude2_sk3:
        with Locations((-10.106342554, 0)):
            Circle(SKETCH5_R_2)
    cut_extrude2_tool3 = extrude(cut_extrude2_sk3.sketch, amount=-CUT_EXTRUDE2_REACH, mode=Mode.PRIVATE) & part.part
    add(cut_extrude2_tool3.solids().sort_by_distance((-10.106343, 4, 0))[0], mode=Mode.SUBTRACT)


solid = part.part
